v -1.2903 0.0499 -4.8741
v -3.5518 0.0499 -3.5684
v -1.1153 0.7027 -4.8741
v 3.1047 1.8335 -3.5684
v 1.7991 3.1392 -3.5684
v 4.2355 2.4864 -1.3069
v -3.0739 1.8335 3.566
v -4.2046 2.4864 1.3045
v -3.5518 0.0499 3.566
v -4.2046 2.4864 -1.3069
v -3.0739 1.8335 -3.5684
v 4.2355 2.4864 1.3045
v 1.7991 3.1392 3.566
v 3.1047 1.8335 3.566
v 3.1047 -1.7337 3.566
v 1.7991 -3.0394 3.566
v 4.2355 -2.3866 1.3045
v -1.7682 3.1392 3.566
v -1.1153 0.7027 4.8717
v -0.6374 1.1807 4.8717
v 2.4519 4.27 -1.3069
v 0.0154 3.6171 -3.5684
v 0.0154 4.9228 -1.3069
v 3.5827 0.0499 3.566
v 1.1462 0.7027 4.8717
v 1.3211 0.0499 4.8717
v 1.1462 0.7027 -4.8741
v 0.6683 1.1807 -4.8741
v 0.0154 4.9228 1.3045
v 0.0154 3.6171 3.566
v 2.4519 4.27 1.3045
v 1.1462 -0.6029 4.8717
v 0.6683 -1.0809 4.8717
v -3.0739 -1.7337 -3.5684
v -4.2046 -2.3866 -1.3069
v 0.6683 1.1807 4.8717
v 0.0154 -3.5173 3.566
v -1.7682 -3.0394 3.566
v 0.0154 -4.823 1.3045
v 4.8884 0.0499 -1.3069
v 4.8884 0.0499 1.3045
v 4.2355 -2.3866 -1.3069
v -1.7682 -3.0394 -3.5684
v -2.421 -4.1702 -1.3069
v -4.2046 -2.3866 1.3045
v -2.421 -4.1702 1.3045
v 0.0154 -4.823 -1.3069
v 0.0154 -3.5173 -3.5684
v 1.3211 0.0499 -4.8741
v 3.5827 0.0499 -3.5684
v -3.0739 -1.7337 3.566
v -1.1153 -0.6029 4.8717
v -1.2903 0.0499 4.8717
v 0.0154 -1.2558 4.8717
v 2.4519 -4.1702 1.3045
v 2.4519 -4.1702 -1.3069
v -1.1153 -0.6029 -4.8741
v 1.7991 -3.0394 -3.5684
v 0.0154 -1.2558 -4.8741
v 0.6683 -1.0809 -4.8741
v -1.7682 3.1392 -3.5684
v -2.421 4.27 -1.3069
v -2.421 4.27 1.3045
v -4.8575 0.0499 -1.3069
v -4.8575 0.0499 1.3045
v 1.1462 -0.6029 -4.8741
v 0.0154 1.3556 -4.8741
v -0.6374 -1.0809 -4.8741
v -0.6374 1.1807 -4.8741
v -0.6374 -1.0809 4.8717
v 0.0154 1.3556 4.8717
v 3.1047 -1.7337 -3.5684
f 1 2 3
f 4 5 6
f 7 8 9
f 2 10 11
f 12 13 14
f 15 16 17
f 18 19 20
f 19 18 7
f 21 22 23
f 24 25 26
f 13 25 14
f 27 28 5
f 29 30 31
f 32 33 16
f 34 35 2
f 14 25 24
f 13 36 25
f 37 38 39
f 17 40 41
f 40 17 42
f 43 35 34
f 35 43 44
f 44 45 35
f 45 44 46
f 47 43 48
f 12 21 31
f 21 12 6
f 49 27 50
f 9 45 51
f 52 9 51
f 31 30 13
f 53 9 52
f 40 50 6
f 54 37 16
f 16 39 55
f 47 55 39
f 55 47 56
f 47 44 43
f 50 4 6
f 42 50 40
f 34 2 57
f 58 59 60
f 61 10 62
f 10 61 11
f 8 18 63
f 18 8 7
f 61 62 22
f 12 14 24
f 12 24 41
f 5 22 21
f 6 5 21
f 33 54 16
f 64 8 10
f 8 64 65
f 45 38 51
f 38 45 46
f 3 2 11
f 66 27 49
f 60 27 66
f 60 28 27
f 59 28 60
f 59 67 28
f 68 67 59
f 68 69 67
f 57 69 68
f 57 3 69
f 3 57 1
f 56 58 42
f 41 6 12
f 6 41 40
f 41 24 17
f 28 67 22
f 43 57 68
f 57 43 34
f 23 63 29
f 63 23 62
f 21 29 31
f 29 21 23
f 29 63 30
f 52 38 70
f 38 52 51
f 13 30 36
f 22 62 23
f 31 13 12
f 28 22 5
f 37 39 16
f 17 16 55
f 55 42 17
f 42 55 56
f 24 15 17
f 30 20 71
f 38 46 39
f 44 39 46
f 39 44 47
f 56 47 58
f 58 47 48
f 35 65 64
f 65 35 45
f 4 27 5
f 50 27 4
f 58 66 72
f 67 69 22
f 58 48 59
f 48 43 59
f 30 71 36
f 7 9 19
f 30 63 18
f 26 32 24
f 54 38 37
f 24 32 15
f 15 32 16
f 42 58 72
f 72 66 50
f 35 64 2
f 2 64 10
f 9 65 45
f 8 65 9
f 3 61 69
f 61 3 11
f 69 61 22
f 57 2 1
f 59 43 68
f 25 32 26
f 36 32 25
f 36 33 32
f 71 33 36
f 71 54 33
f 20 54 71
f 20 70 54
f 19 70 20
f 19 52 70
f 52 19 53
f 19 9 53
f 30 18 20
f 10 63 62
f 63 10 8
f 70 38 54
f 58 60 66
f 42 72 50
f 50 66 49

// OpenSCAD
intersection() {
  cube(size = [11.9999, 11.9999, 11.9999], center = true);

  union() {
    union() {
      translate([0.01544, 0.0499, -0.00119])
      sphere(r = 5.04482, $fn = 12);
    
      translate([0.01544, 0.0499, -0.00119])
      sphere(r = 5.04482, $fn = 12);
    }
  }
}
